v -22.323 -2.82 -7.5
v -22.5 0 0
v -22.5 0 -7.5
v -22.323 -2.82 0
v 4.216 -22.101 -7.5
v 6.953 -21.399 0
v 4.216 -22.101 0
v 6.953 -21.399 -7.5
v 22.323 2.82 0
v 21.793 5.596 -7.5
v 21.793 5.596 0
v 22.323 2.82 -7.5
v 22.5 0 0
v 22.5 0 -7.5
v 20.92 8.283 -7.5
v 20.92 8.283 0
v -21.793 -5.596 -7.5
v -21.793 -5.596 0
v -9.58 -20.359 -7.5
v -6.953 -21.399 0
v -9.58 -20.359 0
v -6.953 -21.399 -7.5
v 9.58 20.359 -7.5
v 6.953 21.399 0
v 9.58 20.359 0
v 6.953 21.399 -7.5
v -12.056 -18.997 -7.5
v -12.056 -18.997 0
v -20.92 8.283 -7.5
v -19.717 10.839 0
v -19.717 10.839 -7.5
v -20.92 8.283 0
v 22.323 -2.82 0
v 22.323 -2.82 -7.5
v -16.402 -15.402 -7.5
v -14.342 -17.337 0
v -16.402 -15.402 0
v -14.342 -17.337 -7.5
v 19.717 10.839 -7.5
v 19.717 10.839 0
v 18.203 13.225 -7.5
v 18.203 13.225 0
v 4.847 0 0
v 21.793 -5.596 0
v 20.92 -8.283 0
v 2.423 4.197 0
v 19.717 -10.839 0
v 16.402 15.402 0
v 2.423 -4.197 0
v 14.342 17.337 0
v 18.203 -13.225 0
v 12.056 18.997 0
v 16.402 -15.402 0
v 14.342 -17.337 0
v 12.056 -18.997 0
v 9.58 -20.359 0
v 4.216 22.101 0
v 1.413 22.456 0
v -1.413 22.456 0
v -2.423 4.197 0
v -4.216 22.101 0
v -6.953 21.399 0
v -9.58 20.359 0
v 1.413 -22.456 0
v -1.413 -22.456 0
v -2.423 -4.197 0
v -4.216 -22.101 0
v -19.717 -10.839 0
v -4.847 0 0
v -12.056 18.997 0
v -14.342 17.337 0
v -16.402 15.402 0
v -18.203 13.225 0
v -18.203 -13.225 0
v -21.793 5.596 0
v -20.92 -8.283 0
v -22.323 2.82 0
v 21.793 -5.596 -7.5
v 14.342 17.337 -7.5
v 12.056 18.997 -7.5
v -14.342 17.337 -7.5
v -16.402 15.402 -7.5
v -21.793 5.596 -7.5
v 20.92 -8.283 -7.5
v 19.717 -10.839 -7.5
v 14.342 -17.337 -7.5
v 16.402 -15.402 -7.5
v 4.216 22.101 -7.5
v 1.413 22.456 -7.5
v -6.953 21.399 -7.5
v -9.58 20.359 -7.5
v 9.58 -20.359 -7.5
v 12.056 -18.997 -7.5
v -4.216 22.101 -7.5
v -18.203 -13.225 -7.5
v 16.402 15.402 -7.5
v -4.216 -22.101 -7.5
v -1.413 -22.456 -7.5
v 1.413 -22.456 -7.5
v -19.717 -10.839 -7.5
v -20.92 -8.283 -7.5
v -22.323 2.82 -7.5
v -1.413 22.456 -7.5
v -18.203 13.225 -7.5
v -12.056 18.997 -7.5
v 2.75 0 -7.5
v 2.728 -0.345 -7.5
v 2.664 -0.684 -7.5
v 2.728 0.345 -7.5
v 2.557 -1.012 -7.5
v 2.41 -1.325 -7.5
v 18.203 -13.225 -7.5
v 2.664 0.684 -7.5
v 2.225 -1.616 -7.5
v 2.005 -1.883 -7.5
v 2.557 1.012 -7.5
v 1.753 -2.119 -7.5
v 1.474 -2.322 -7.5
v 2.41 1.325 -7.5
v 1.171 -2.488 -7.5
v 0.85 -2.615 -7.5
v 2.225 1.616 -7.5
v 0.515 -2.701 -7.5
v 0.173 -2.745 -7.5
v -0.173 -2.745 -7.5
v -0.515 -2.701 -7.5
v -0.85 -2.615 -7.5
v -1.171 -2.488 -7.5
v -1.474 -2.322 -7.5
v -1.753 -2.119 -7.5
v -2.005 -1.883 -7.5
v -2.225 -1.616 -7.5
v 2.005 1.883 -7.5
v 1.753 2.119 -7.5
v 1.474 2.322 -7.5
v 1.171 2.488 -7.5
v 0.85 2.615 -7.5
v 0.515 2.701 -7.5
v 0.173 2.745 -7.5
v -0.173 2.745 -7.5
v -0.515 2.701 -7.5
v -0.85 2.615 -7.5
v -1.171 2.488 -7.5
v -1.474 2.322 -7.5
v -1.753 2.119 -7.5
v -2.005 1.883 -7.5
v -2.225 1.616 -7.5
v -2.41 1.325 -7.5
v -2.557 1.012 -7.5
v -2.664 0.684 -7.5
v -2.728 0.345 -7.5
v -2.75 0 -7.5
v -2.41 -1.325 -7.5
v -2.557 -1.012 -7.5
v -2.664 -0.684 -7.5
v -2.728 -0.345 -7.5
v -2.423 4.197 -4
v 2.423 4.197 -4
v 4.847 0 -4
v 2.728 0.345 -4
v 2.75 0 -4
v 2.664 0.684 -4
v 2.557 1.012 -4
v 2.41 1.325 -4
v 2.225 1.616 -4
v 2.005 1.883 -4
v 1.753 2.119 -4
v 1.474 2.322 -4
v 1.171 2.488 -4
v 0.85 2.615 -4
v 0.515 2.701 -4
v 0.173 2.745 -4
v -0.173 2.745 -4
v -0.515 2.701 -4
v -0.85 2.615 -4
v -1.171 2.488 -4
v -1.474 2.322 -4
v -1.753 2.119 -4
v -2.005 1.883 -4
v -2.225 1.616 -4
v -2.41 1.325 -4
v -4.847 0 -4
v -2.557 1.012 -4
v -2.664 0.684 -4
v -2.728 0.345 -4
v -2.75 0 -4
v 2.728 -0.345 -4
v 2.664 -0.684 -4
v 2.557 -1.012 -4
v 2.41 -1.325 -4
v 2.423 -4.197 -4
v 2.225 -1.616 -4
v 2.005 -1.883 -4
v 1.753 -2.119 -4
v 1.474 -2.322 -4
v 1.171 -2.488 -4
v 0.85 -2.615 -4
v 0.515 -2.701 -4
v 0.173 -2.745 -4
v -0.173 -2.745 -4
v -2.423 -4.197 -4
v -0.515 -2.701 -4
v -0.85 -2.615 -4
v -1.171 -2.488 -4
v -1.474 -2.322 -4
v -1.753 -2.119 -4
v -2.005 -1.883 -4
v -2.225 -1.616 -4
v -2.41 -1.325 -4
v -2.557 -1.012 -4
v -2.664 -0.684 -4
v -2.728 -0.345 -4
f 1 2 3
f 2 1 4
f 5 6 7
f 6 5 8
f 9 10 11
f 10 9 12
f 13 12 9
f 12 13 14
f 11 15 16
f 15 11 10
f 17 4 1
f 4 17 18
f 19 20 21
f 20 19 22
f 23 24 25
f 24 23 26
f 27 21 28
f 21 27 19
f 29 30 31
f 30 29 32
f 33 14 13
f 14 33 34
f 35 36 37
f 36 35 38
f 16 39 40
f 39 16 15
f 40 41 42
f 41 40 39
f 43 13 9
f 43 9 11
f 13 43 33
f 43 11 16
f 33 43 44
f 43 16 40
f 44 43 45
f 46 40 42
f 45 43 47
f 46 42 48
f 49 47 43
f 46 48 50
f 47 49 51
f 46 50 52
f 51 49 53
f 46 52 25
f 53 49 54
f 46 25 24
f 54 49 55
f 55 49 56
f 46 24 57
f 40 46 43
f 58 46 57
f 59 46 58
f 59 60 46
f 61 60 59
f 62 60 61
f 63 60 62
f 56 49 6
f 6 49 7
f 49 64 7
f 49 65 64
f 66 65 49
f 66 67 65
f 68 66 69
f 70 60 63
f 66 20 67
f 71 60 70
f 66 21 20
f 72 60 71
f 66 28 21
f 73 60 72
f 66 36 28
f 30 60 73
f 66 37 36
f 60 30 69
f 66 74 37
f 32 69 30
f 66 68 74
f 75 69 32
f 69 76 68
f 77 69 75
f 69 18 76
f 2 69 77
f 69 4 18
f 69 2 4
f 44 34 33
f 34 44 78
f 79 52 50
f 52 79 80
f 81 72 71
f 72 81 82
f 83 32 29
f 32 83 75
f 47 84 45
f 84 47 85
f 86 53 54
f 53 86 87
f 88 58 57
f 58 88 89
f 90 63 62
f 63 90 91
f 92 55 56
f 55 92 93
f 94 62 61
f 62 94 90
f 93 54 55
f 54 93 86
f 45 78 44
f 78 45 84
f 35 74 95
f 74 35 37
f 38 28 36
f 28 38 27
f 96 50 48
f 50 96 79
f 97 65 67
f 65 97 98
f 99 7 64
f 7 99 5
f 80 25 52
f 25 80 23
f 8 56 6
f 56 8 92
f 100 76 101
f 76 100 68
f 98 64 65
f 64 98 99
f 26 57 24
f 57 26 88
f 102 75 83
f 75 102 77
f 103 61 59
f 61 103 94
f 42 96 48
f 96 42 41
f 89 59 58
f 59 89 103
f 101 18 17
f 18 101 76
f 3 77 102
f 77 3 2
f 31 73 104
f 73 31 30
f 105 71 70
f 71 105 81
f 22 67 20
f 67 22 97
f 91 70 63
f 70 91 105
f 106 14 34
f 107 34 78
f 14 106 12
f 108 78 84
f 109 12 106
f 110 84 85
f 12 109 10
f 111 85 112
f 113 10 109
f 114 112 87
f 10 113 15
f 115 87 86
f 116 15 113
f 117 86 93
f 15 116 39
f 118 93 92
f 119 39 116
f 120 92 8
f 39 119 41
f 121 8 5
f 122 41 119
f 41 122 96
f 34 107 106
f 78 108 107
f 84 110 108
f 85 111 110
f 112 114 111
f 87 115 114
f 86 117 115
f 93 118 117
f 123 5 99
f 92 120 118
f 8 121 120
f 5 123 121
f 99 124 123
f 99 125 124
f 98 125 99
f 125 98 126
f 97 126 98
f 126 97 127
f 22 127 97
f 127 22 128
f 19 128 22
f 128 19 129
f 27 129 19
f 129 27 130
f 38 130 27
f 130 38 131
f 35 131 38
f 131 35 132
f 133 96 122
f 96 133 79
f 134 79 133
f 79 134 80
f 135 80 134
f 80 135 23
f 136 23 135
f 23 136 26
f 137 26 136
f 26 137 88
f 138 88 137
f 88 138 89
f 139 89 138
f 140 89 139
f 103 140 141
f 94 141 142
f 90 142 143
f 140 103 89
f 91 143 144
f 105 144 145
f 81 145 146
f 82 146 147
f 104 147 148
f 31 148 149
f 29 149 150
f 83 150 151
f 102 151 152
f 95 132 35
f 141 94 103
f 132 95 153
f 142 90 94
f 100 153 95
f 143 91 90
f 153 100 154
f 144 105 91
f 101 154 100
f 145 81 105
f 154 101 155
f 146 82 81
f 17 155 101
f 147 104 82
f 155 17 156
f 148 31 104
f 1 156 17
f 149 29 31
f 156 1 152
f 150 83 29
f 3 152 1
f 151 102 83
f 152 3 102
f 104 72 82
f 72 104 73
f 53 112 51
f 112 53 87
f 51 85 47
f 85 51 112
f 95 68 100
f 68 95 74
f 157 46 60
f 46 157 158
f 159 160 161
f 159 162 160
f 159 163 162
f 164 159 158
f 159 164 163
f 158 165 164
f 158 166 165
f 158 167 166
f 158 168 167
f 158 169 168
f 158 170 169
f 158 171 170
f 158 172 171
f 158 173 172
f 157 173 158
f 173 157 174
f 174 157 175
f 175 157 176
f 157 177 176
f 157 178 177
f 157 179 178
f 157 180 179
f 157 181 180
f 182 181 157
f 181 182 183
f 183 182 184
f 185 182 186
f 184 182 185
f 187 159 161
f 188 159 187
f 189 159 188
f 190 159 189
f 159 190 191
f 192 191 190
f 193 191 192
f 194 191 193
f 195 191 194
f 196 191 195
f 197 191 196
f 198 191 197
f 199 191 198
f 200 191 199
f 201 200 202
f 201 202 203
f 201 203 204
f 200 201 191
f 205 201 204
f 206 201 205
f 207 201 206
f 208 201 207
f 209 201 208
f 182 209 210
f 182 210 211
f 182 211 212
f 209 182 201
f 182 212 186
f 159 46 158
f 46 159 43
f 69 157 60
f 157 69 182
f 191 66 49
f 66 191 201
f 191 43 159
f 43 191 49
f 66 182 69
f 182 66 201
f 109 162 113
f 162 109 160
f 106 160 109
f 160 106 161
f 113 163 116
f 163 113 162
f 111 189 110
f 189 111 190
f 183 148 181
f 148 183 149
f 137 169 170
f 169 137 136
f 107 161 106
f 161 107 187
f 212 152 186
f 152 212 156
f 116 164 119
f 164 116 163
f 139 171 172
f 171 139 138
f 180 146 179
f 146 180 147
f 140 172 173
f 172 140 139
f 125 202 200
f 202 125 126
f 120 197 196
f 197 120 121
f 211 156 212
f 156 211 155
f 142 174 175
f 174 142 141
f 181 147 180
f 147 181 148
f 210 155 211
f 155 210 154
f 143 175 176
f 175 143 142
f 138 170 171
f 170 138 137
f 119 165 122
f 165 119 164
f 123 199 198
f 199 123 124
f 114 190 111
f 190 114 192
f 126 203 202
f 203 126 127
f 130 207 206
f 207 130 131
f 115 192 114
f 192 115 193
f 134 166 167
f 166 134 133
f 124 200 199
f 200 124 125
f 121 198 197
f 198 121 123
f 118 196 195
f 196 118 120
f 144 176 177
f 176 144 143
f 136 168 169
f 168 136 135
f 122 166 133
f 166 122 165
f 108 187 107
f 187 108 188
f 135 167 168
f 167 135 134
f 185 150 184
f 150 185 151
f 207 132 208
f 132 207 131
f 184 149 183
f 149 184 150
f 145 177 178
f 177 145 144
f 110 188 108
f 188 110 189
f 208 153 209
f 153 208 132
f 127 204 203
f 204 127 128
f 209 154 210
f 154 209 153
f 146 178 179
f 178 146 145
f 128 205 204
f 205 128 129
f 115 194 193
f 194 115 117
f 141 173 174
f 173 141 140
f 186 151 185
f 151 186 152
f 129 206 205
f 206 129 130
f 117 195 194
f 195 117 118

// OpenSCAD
$fn = 50;


difference() {
	union() {
		translate(v = [0, 0, -7.5000000000]) {
			cylinder(h = 7.5000000000, r = 22.5000000000);
		}
		translate(v = [0, 0, -6.0000000000]) {
			cylinder(h = 6, r = 2.8750000000);
		}
	}
	union() {
		translate(v = [0, 0, 0]) {
			rotate(a = [0, 0, 0]) {
				difference() {
					union() {
						translate(v = [0, 0, -4]) {
							linear_extrude(height = 4) {
								polygon(points = [[4.8468000000, 0.0000000000], [2.4234000000, 4.1974519271], [-2.4234000000, 4.1974519271], [-4.8468000000, 0.0000000000], [-2.4234000000, -4.1974519271], [2.4234000000, -4.1974519271]]);
							}
						}
					}
					union();
				}
			}
		}
		#translate(v = [0, 0, -100.0000000000]) {
			cylinder(h = 200, r = 2.7500000000);
		}
	}
}
